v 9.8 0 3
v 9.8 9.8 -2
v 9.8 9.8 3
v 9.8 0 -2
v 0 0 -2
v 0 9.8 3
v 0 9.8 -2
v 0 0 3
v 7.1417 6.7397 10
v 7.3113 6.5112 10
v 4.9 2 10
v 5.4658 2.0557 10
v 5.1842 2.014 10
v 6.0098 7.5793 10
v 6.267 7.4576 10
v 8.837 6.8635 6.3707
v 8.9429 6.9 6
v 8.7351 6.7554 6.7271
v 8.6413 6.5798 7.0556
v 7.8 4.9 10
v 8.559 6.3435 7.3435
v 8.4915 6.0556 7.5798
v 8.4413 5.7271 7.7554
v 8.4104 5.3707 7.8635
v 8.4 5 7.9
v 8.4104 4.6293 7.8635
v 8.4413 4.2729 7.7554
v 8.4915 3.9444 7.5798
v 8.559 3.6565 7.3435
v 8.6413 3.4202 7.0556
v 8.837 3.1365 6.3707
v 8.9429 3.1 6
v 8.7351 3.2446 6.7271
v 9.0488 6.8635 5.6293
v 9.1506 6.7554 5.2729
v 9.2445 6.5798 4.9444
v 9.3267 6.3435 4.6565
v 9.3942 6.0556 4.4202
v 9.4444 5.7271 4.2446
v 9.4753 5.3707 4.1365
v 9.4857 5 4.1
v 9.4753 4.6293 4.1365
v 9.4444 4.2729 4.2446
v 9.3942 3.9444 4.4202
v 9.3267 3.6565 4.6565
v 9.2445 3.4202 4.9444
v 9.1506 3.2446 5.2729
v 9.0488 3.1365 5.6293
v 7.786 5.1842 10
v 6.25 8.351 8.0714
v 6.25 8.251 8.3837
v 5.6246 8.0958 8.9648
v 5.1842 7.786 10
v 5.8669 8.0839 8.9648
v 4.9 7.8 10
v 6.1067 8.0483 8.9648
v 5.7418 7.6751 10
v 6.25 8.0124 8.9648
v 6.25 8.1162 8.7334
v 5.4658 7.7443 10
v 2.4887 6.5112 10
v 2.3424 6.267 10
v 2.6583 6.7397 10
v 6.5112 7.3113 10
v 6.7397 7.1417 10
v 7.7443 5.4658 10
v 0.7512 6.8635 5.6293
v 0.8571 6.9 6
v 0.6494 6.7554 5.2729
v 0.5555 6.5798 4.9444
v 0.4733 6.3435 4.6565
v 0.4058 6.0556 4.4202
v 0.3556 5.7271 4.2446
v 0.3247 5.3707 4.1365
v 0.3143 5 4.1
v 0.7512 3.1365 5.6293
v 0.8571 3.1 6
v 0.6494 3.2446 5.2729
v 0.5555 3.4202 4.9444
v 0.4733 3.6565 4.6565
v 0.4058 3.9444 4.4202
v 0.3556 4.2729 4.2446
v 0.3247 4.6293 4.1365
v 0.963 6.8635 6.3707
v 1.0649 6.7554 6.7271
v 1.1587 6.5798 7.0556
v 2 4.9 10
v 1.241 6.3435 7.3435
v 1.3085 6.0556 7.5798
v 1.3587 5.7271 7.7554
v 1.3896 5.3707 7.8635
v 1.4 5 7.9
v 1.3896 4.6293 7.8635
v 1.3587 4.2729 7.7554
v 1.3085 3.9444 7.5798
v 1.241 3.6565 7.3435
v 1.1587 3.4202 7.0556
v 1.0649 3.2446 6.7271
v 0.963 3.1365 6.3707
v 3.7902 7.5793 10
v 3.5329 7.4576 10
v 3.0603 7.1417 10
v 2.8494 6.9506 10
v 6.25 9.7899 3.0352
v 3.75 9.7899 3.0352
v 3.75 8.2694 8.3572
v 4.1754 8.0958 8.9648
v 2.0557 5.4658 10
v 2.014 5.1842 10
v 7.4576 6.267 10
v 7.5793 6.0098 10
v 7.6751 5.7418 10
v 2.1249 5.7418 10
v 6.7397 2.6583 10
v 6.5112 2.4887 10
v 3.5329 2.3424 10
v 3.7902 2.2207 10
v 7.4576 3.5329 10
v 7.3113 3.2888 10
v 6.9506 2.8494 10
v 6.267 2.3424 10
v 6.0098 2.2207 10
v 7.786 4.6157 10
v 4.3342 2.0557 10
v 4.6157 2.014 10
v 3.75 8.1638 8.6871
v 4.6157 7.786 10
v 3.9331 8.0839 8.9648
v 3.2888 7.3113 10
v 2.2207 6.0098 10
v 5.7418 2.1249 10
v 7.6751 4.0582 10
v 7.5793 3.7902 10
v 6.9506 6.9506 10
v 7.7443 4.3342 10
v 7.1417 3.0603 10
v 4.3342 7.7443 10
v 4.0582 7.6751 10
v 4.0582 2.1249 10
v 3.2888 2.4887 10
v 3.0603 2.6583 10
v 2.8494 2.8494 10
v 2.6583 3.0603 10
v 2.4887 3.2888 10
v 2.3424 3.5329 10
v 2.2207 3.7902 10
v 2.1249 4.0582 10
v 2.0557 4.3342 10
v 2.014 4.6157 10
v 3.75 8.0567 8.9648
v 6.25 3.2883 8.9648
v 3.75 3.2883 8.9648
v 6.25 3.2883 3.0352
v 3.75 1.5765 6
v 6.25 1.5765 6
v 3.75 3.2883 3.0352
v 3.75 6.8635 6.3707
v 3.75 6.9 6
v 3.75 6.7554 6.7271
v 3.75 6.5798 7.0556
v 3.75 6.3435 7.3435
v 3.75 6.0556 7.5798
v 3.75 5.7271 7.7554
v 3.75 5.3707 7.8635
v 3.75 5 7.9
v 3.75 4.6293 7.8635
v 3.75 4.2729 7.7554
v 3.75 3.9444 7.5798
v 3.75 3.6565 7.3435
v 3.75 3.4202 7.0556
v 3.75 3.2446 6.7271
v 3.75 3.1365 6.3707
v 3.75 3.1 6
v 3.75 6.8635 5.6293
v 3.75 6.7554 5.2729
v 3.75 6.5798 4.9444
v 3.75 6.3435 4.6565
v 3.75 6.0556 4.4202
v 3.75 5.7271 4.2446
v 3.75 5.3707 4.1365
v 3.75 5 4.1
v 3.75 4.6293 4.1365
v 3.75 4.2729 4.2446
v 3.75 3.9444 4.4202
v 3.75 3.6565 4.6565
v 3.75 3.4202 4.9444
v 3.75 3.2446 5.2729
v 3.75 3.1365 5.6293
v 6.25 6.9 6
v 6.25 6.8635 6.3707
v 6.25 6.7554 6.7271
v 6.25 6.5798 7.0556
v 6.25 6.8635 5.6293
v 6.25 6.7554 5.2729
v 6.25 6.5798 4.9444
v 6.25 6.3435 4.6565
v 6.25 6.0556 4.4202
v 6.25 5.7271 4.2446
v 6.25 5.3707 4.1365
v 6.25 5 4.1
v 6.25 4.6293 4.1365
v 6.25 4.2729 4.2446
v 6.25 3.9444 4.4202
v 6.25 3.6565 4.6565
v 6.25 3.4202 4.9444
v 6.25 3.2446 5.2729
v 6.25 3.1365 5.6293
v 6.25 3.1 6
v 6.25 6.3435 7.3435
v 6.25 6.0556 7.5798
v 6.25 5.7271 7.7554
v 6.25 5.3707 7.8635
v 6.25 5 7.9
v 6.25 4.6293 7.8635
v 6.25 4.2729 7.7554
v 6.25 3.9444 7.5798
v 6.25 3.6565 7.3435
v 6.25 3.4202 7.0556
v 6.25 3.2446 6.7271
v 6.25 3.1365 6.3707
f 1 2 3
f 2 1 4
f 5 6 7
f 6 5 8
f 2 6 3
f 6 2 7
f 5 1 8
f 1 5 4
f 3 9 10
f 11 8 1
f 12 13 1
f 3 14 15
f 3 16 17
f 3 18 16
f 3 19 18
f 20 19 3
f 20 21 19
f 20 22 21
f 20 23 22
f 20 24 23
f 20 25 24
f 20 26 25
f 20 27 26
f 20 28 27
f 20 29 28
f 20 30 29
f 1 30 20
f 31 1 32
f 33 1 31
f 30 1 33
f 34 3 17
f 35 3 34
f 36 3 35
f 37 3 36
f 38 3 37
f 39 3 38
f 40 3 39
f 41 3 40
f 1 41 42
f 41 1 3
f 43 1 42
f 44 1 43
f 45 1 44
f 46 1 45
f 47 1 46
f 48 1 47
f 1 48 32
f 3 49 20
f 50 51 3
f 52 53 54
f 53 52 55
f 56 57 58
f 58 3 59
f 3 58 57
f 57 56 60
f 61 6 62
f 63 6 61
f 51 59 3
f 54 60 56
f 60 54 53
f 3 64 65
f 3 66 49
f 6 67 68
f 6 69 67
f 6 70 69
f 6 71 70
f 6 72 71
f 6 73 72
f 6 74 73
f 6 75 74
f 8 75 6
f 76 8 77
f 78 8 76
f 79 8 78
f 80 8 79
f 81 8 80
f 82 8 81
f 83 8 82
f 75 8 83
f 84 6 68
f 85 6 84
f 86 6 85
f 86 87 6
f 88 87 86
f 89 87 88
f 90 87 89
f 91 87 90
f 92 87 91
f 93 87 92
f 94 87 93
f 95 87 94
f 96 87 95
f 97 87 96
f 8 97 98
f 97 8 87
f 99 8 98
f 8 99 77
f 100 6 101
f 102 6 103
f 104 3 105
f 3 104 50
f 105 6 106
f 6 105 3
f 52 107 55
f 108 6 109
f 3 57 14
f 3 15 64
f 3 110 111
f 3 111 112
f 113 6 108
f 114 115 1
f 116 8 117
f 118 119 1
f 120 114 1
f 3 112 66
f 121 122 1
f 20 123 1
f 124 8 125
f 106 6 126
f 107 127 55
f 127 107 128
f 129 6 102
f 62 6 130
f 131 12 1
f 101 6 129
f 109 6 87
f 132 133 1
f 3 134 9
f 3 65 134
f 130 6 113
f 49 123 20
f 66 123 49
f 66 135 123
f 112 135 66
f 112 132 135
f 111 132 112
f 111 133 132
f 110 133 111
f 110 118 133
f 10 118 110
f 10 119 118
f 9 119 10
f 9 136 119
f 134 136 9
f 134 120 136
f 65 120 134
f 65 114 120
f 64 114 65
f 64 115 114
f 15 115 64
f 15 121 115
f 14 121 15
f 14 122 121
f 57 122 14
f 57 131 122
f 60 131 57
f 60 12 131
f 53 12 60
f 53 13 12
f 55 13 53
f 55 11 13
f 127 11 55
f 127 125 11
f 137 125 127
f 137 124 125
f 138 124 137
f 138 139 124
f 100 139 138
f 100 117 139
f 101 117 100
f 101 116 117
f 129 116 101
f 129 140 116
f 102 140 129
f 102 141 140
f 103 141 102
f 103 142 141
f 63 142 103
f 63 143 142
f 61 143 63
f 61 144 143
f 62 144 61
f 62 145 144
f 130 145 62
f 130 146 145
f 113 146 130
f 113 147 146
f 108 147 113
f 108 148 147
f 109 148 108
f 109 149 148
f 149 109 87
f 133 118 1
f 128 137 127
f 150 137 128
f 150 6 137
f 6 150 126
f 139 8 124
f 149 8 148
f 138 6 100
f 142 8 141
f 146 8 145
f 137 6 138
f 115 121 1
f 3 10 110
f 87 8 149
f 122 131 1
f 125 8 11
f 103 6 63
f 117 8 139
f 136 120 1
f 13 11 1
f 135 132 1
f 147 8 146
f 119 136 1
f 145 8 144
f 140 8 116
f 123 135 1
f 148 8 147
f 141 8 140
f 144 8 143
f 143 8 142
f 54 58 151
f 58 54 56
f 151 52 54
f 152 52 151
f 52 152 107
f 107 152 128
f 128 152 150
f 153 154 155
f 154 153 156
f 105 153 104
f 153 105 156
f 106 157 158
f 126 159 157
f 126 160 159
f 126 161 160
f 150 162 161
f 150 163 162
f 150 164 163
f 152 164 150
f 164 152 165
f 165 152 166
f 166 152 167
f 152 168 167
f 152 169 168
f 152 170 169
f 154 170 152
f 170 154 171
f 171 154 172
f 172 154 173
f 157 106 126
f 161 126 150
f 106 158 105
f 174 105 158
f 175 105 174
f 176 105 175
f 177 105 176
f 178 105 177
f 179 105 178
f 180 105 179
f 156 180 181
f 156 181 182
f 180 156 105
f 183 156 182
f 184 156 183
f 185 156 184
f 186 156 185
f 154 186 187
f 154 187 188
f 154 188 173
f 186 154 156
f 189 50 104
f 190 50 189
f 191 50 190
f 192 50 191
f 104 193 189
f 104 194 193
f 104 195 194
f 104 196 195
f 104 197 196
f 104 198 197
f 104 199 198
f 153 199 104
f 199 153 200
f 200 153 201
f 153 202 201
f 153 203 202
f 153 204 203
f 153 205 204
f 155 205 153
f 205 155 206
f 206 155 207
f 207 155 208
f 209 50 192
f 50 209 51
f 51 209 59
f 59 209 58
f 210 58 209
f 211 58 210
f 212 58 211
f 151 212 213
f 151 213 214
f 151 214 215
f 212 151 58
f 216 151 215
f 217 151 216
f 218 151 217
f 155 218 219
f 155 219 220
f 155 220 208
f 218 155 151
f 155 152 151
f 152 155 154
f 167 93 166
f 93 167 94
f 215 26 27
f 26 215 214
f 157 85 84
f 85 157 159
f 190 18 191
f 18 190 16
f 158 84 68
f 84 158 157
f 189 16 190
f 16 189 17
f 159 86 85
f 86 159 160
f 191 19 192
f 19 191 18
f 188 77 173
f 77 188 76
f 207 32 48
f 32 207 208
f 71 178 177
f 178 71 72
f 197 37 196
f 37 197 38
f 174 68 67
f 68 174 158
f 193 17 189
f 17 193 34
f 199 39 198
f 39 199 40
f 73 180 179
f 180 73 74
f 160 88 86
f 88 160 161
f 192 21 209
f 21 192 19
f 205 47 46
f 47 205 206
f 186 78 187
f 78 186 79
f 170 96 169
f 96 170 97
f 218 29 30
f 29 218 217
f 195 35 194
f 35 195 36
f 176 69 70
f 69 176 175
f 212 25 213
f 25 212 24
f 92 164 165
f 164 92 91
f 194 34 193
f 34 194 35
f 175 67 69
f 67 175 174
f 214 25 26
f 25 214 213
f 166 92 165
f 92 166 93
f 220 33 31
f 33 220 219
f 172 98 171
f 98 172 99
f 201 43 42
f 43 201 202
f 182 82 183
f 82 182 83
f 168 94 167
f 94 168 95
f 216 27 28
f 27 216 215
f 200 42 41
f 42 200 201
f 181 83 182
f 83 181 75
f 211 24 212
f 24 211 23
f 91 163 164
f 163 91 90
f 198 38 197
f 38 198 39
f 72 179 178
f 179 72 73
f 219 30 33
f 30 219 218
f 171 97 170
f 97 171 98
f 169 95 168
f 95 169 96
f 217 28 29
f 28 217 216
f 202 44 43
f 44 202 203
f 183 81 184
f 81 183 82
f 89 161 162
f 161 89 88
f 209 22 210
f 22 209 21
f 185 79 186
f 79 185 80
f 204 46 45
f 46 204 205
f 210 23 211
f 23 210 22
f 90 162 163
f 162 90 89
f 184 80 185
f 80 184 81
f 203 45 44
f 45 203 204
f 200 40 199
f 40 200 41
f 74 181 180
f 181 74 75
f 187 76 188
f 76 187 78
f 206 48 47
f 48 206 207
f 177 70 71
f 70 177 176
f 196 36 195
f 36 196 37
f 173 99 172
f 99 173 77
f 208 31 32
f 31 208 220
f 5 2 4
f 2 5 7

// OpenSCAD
// file: ../profiles.scad
/*
    case-files v2
    This file contains
    Example usage:

 profileName = "mini";
 varName = "mainRailSideMountScrewType";

 profile = getProfile(profileName);
 echo("val:", getConfigValue(profile, varName));
 */

_profileConfigs = [
    ["default", [
      ["maxUnitWidth", 205],
      ["maxUnitDepth", 205],
      ["screwDiff", 10],
      ["numRailScrews", 20],
      ["mainRailScrewType", "m4"],
      ["mainRailSideMountScrewType", "m4"],
      ["rackFrameScrewType", "m3"],
      ["baseRoundness", 5],
    ]],
    ["micro", [
      ["maxUnitWidth", 105],
      ["maxUnitDepth", 105],
      ["numRailScrews", 10],
      ["baseRoundness", 5]
    ]],
    ["mini", [
      ["maxUnitWidth", 205],
      ["maxUnitDepth", 205],
      ["numRailScrews", 20],
      ["baseRoundness", 5]
    ]]
  ];

function _getConfigValueRaw(profile, varName) = profile[search([varName], profile)[0]][1];
function _getProfileRaw(profileName) = _profileConfigs[search([profileName], _profileConfigs)[0]][1];

function _getConfigValueOrThrowError(val) = val == undef? assert(false, "blah") 0: val;
function _getConfigValueOrDefault(val, default) = val == undef? default: val;

function getConfigValue(profile, varName) =
  _getConfigValueOrDefault(
    _getConfigValueRaw(profile, varName),
    _getConfigValueOrThrowError(_getConfigValueRaw(getProfile("default"), varName))
  );

function getProfile(profileName) = _getConfigValueOrThrowError(_getProfileRaw(profileName));
// file: ../config.scad
/*
   case-files v2
   This file contains parameters used for declaring/generating a customized rack frame.

   - All dimensions are in millimetres (mm) unless stated otherwise.
   - "_N" appended to a module is meant to denote that this module is a negative volume, and should only be used to
     substract from other volumes. "_P" is meant to denote a positive value. Modules are positive by default.
*/
include <./profiles.scad>

profileName = "micro";
profile = getProfile(profileName);

// echo("Profile:", profile);

function getConfig(name) = getConfigValue(profile, name);

// Maximum width for rack-mount units. Change this according your max expected enclosure width.
// Changing this will directly affect the required build volume.
maxUnitWidth = getConfig("maxUnitWidth");

// Maximum (recommended) unit depth. There technically isn't a max unit depth because there's no physical bound on
// how far a rack unit can extrude back. This parameter basically controls the distance between the front of the front
// rails and the back of the back rails. Changing this will directly affect the required build volume.
maxUnitDepth = getConfig("maxUnitDepth");

// Vertical distance between the midpoint of adjacent screws mounts. Affects build volume.
screwDiff = getConfig("screwDiff");

// Number screw slots on the main rail. Affects build volume.
numRailScrews = getConfig("numRailScrews");

// Screw type used for rackmount units. See screws.scad.
mainRailScrewType = getConfig("mainRailScrewType");

// Screw type used to affix side rails.
mainRailSideMountScrewType = getConfig("mainRailSideMountScrewType");

// Screw type used for constructing the actual rack frame.
rackFrameScrewType = getConfig("rackFrameScrewType");
// Currently, only m3 screws are supported here (tolerance issues)
assert(rackFrameScrewType == "m3");

// Fillet radius for main rack profile
baseRoundness = getConfig("baseRoundness");
// file: ../../helper/screws.scad
/* Some common screw dimensions and helper functions/modules */

include <./math.scad>
include <./common.scad>

/********************************************************************************/
// M3 dimensions
m3HoleRadiusSlack = 0.4; // higher slack for not-so straight heat set inserts
m3Diameter = 3.0;
m3Radius = m3Diameter / 2.0;
m3RadiusSlacked = m3Radius + m3HoleRadiusSlack;

m3CounterSunkHeadRadius = 3;
m3CounterSunkHeadLength = 1.7;

m3HexNutWidthAcrossFlats = 5.41;
m3HexNutWidthAcrossCorners = FtoG(m3HexNutWidthAcrossFlats);
m3HexNutThickness = 2.2;

m3HeatSetInsertSlotRadiusSlack = -0.1;
m3HeatSetInsertSlotHeightSlack = 0.5;

m3HeatSetInsertSlotRadius = 2.3;
m3HeatSetInsertSlotHeight = 5.7;

m3HeatSetInsertSlotRadiusSlacked = m3HeatSetInsertSlotRadius+m3HeatSetInsertSlotRadiusSlack;
m3HeatSetInsertSlotHeightSlacked = m3HeatSetInsertSlotHeight+m3HeatSetInsertSlotHeightSlack;

/********************************************************************************/
// M4 dimensions
m4HoleRadiusSlack = 0.15;
m4Diameter = 4.0;
m4Radius = m4Diameter / 2.0;
m4RadiusSlacked = m4Radius + m4HoleRadiusSlack;
m4HexNutWidthAcrossFlats = 6.89;
m4HexNutWidthAcrossCorners = FtoG(m4HexNutWidthAcrossFlats);
m4HexNutThickness = 3.07;

/********************************************************************************/

module heatSetInsertSlot_N(screwType, topExtension=inf50) {
  if (screwType == "m3") {
    union() {
      // actual slot for insert
      cylinder(h = m3HeatSetInsertSlotHeightSlacked, r = m3HeatSetInsertSlotRadiusSlacked);

      // extra space above slot to help with insertion
      translate(v=[0, 0, m3HeatSetInsertSlotHeightSlacked])
      cylinder(h = topExtension, r = m3HeatSetInsertSlotRadiusSlacked);
    }
  } else {
    error("Unsupported screw type");
  }
}

function screwRadiusSlacked(screwType) =
  (screwType == "m3")
  ? m3RadiusSlacked
  : (screwType == "m4")
  ? m4RadiusSlacked
  : error("Unsupported screw type");


module counterSunkHead_N(screwType, screwExtension=0, headExtension=0) {

  if (screwType == "m3") {
    translate(v=[0,0,-m3CounterSunkHeadLength])
    union() {
      cylinder(r1 = m3RadiusSlacked, r2 = m3CounterSunkHeadRadius, h = m3CounterSunkHeadLength);

      translate(v = [0, 0, -screwExtension])
      cylinder(r = m3RadiusSlacked, h = screwExtension);

      translate(v = [0, 0, m3CounterSunkHeadLength])
      cylinder(r = m3CounterSunkHeadRadius, h = headExtension);
    }
  } else {
    error("Unsupported screw type");
  }
}


module hexNutPocket_N(screwType, openSide=true) {
  if (screwType == "m3") {
    hexNutPocketHelper_N(m3RadiusSlacked, m3HexNutWidthAcrossCorners / 2 + 0.3, m3HexNutThickness + 0.3, openSide=openSide);
  } else if (screwType == "m4") {
    hexNutPocketHelper_N(m4RadiusSlacked, m4HexNutWidthAcrossCorners / 2 + 0.1, m4HexNutThickness + 0.2, openSide=openSide);
  } else {
    error("Unsupported screw type");
  }
}

module hexNutPocketHelper_N(innerRadius, widthAcrossCorners, thickness, openSide=true) {
  union() {
    hull() {
      // hexagonal cylinder representing where the nut should fit
      cylinder(r = widthAcrossCorners, h = thickness, center = true, $fn = 6);

      // negative volume for sliding in the nut
      translate(v = [inf50, 0, 0])
      cylinder(r = widthAcrossCorners, h = thickness, center = true, $fn = 6);
    }

    // negative volume for screw lead
    translate(v = [0, 0, - 10])
    cylinder(r = innerRadius, h = inf50, $fn = 32);

    if (openSide) {
      hull() {
        translate(v = [inf50, 0, 0])
        cylinder(r = innerRadius, h = inf50, $fn = 32);
        cylinder(r = innerRadius, h = inf50, $fn = 32);
      }
    }
  }
}

// Convert a regular hexagon widthAcrossFlats to widthAcrossCorners
function FtoG(widthAcrossFlats) = widthAcrossFlats * (2 / sqrt(3));

// Convert a regular hexagon widthAcrossCorners to widthAcrossFlats
function GtoF(widthAcrossCorners) = widthAcrossCorners * (sqrt(3) / 2);
// file: ../../helper/magnet.scad
// Dimensions for small cylindrical neodymium magnets that I bought off Amazon
magnetR = 3;
magnetH = 1.7;

magnetRSlack = 0.1;
magnetHSlack = 0.05;

magnetRSlacked = magnetR + magnetRSlack;
magnetHSlacked = magnetH + magnetHSlack;
// file: ../../helper/common.scad
/* Some commonly used variables plus functions
*/

$fn=64;
// TODO move these to math
eps=0.00001;

inf10 = 10;
inf50 = 50;
inf1000 = 1000;
inf = inf1000;


module apply_p() {
  union() {
    children(0);
    children(1);
  }
}

module apply_n() {
  difference() {
    children(1);
    children(0);
  }
}

module apply_pn() {
  difference() {
    union() {
      children(0);
      children(2);
    }
    children(1);
  }
}

module apply_np() {
  difference() {
    union() {
      children(1);
      children(2);
    }
    children(0);
  }
}
// file: ../../helper/math.scad
// TODO remove/rename this file
/* Example usage:
for (i=mirror4XY(midpoint=[0,0,0], offsetX=90, offsetY=90)) {
    translate(v=i)
        something();
}
*/

module mirror4XY(p, dx, dy) {

    px = p[0];
    py = p[1];

    translate(v=[px, py, 0])
    children(0);

    translate(v=[px+dx, py, 0])
    children(0);

    translate(v=[px, py+dy, 0])
    children(0);

    translate(v=[px+dx, py+dy, 0])
    children(0);
}
// file: ../stackConnector.scad
include <../helper/math.scad>
include <../helper/common.scad>
include <../helper/magnet.scad>
include <../helper/screws.scad>

include <./config.scad>

connectorRectWidth = 10;
connectorRectDepth = 10;
connectorTotalHeight = 10;
connectorSocketMagnetExtrudeHeight = 1;
connectorTaperStartHeight = 3;

connectorTopR = 3;

connectorRectPlugSlack = -0.2;
connectorRectSocketSlack = 0.2;

connectorBottomToScrew = 6;

stackConnectorBottom();

module stackConnectorBase(rectSlack, topSlack=0.0) {

  wSlacked = connectorRectWidth + rectSlack;
  dSlacked = connectorRectDepth + rectSlack;
  topRSlacked = connectorTopR + rectSlack/2;

  module connRect() {
    linear_extrude(height=eps)
    square(size = [wSlacked, dSlacked]);
  }

  module connTop() {
    linear_extrude(height=eps)
    circle(r=topRSlacked);
  }

  hull() {
    connRect();

    translate(v=[0,0,connectorTaperStartHeight])
    connRect();
  }

  hull() {
    translate(v = [0, 0, connectorTaperStartHeight])
    connRect();

    translate(v=[wSlacked/2, dSlacked/2, connectorTotalHeight+topSlack])
    connTop();
  }
}


module stackConnectorSocket_N() {

  wSlacked = connectorRectWidth + connectorRectSocketSlack;
  dSlacked = connectorRectDepth + connectorRectSocketSlack;

  bevelSlack = 0.6;
  bevelR = wSlacked + bevelSlack;
  bevelW = dSlacked + bevelSlack;
  bevelH = 0.6;

  screwExtension = 4;


  union() {
    stackConnectorBase(connectorRectSocketSlack, topSlack=0.4);

    translate(v = [-screwExtension, connectorRectDepth/2, connectorBottomToScrew])
    rotate(a = [0, -90, 0])
    counterSunkHead_N(rackFrameScrewType, screwExtension = 5, headExtension = 10);

    // bevel at the lip of the socket to guide the plug, as well as mitigate elephant foot during 3d printing
    hull() {
      translate(v = [0, 0, bevelH])
      linear_extrude(height = eps)
      square(size = [wSlacked, dSlacked]);

      translate(v = [-bevelSlack/2, -bevelSlack/2, 0])
      linear_extrude(height = eps)
      square(size = [bevelR, bevelW]);
    }
  }
}

module stackConnectorPlug() {

  difference() {
    stackConnectorBase(connectorRectPlugSlack);

    translate(v=[connectorRectWidth/2,connectorRectDepth/2,connectorBottomToScrew])
    rotate(a=[0,0,90])
    rotate(a=[90,0,0])
    hexNutPocket_N(rackFrameScrewType, openSide=false);
  }
}

module stackConnectorDual() {

  space = 0.5; // extra space inbetween

  translate(v=[0,0,space])
  stackConnectorPlug();

  mirror(v=[0,0,1])
  stackConnectorPlug();

  cube(size=[connectorRectWidth+connectorRectPlugSlack, connectorRectDepth+connectorRectPlugSlack, space]);
}


module stackConnectorBottom() {

  height = 2; // space between bottom and floor

  stackConnectorPlug();
  translate(v=[0,0,-height])
  cube(size=[connectorRectWidth+connectorRectPlugSlack, connectorRectDepth+connectorRectPlugSlack, height]);
}
// main file
include <../stackConnector.scad>

// Oriented for 3d printing. No supports required.
stackConnectorBottom();
